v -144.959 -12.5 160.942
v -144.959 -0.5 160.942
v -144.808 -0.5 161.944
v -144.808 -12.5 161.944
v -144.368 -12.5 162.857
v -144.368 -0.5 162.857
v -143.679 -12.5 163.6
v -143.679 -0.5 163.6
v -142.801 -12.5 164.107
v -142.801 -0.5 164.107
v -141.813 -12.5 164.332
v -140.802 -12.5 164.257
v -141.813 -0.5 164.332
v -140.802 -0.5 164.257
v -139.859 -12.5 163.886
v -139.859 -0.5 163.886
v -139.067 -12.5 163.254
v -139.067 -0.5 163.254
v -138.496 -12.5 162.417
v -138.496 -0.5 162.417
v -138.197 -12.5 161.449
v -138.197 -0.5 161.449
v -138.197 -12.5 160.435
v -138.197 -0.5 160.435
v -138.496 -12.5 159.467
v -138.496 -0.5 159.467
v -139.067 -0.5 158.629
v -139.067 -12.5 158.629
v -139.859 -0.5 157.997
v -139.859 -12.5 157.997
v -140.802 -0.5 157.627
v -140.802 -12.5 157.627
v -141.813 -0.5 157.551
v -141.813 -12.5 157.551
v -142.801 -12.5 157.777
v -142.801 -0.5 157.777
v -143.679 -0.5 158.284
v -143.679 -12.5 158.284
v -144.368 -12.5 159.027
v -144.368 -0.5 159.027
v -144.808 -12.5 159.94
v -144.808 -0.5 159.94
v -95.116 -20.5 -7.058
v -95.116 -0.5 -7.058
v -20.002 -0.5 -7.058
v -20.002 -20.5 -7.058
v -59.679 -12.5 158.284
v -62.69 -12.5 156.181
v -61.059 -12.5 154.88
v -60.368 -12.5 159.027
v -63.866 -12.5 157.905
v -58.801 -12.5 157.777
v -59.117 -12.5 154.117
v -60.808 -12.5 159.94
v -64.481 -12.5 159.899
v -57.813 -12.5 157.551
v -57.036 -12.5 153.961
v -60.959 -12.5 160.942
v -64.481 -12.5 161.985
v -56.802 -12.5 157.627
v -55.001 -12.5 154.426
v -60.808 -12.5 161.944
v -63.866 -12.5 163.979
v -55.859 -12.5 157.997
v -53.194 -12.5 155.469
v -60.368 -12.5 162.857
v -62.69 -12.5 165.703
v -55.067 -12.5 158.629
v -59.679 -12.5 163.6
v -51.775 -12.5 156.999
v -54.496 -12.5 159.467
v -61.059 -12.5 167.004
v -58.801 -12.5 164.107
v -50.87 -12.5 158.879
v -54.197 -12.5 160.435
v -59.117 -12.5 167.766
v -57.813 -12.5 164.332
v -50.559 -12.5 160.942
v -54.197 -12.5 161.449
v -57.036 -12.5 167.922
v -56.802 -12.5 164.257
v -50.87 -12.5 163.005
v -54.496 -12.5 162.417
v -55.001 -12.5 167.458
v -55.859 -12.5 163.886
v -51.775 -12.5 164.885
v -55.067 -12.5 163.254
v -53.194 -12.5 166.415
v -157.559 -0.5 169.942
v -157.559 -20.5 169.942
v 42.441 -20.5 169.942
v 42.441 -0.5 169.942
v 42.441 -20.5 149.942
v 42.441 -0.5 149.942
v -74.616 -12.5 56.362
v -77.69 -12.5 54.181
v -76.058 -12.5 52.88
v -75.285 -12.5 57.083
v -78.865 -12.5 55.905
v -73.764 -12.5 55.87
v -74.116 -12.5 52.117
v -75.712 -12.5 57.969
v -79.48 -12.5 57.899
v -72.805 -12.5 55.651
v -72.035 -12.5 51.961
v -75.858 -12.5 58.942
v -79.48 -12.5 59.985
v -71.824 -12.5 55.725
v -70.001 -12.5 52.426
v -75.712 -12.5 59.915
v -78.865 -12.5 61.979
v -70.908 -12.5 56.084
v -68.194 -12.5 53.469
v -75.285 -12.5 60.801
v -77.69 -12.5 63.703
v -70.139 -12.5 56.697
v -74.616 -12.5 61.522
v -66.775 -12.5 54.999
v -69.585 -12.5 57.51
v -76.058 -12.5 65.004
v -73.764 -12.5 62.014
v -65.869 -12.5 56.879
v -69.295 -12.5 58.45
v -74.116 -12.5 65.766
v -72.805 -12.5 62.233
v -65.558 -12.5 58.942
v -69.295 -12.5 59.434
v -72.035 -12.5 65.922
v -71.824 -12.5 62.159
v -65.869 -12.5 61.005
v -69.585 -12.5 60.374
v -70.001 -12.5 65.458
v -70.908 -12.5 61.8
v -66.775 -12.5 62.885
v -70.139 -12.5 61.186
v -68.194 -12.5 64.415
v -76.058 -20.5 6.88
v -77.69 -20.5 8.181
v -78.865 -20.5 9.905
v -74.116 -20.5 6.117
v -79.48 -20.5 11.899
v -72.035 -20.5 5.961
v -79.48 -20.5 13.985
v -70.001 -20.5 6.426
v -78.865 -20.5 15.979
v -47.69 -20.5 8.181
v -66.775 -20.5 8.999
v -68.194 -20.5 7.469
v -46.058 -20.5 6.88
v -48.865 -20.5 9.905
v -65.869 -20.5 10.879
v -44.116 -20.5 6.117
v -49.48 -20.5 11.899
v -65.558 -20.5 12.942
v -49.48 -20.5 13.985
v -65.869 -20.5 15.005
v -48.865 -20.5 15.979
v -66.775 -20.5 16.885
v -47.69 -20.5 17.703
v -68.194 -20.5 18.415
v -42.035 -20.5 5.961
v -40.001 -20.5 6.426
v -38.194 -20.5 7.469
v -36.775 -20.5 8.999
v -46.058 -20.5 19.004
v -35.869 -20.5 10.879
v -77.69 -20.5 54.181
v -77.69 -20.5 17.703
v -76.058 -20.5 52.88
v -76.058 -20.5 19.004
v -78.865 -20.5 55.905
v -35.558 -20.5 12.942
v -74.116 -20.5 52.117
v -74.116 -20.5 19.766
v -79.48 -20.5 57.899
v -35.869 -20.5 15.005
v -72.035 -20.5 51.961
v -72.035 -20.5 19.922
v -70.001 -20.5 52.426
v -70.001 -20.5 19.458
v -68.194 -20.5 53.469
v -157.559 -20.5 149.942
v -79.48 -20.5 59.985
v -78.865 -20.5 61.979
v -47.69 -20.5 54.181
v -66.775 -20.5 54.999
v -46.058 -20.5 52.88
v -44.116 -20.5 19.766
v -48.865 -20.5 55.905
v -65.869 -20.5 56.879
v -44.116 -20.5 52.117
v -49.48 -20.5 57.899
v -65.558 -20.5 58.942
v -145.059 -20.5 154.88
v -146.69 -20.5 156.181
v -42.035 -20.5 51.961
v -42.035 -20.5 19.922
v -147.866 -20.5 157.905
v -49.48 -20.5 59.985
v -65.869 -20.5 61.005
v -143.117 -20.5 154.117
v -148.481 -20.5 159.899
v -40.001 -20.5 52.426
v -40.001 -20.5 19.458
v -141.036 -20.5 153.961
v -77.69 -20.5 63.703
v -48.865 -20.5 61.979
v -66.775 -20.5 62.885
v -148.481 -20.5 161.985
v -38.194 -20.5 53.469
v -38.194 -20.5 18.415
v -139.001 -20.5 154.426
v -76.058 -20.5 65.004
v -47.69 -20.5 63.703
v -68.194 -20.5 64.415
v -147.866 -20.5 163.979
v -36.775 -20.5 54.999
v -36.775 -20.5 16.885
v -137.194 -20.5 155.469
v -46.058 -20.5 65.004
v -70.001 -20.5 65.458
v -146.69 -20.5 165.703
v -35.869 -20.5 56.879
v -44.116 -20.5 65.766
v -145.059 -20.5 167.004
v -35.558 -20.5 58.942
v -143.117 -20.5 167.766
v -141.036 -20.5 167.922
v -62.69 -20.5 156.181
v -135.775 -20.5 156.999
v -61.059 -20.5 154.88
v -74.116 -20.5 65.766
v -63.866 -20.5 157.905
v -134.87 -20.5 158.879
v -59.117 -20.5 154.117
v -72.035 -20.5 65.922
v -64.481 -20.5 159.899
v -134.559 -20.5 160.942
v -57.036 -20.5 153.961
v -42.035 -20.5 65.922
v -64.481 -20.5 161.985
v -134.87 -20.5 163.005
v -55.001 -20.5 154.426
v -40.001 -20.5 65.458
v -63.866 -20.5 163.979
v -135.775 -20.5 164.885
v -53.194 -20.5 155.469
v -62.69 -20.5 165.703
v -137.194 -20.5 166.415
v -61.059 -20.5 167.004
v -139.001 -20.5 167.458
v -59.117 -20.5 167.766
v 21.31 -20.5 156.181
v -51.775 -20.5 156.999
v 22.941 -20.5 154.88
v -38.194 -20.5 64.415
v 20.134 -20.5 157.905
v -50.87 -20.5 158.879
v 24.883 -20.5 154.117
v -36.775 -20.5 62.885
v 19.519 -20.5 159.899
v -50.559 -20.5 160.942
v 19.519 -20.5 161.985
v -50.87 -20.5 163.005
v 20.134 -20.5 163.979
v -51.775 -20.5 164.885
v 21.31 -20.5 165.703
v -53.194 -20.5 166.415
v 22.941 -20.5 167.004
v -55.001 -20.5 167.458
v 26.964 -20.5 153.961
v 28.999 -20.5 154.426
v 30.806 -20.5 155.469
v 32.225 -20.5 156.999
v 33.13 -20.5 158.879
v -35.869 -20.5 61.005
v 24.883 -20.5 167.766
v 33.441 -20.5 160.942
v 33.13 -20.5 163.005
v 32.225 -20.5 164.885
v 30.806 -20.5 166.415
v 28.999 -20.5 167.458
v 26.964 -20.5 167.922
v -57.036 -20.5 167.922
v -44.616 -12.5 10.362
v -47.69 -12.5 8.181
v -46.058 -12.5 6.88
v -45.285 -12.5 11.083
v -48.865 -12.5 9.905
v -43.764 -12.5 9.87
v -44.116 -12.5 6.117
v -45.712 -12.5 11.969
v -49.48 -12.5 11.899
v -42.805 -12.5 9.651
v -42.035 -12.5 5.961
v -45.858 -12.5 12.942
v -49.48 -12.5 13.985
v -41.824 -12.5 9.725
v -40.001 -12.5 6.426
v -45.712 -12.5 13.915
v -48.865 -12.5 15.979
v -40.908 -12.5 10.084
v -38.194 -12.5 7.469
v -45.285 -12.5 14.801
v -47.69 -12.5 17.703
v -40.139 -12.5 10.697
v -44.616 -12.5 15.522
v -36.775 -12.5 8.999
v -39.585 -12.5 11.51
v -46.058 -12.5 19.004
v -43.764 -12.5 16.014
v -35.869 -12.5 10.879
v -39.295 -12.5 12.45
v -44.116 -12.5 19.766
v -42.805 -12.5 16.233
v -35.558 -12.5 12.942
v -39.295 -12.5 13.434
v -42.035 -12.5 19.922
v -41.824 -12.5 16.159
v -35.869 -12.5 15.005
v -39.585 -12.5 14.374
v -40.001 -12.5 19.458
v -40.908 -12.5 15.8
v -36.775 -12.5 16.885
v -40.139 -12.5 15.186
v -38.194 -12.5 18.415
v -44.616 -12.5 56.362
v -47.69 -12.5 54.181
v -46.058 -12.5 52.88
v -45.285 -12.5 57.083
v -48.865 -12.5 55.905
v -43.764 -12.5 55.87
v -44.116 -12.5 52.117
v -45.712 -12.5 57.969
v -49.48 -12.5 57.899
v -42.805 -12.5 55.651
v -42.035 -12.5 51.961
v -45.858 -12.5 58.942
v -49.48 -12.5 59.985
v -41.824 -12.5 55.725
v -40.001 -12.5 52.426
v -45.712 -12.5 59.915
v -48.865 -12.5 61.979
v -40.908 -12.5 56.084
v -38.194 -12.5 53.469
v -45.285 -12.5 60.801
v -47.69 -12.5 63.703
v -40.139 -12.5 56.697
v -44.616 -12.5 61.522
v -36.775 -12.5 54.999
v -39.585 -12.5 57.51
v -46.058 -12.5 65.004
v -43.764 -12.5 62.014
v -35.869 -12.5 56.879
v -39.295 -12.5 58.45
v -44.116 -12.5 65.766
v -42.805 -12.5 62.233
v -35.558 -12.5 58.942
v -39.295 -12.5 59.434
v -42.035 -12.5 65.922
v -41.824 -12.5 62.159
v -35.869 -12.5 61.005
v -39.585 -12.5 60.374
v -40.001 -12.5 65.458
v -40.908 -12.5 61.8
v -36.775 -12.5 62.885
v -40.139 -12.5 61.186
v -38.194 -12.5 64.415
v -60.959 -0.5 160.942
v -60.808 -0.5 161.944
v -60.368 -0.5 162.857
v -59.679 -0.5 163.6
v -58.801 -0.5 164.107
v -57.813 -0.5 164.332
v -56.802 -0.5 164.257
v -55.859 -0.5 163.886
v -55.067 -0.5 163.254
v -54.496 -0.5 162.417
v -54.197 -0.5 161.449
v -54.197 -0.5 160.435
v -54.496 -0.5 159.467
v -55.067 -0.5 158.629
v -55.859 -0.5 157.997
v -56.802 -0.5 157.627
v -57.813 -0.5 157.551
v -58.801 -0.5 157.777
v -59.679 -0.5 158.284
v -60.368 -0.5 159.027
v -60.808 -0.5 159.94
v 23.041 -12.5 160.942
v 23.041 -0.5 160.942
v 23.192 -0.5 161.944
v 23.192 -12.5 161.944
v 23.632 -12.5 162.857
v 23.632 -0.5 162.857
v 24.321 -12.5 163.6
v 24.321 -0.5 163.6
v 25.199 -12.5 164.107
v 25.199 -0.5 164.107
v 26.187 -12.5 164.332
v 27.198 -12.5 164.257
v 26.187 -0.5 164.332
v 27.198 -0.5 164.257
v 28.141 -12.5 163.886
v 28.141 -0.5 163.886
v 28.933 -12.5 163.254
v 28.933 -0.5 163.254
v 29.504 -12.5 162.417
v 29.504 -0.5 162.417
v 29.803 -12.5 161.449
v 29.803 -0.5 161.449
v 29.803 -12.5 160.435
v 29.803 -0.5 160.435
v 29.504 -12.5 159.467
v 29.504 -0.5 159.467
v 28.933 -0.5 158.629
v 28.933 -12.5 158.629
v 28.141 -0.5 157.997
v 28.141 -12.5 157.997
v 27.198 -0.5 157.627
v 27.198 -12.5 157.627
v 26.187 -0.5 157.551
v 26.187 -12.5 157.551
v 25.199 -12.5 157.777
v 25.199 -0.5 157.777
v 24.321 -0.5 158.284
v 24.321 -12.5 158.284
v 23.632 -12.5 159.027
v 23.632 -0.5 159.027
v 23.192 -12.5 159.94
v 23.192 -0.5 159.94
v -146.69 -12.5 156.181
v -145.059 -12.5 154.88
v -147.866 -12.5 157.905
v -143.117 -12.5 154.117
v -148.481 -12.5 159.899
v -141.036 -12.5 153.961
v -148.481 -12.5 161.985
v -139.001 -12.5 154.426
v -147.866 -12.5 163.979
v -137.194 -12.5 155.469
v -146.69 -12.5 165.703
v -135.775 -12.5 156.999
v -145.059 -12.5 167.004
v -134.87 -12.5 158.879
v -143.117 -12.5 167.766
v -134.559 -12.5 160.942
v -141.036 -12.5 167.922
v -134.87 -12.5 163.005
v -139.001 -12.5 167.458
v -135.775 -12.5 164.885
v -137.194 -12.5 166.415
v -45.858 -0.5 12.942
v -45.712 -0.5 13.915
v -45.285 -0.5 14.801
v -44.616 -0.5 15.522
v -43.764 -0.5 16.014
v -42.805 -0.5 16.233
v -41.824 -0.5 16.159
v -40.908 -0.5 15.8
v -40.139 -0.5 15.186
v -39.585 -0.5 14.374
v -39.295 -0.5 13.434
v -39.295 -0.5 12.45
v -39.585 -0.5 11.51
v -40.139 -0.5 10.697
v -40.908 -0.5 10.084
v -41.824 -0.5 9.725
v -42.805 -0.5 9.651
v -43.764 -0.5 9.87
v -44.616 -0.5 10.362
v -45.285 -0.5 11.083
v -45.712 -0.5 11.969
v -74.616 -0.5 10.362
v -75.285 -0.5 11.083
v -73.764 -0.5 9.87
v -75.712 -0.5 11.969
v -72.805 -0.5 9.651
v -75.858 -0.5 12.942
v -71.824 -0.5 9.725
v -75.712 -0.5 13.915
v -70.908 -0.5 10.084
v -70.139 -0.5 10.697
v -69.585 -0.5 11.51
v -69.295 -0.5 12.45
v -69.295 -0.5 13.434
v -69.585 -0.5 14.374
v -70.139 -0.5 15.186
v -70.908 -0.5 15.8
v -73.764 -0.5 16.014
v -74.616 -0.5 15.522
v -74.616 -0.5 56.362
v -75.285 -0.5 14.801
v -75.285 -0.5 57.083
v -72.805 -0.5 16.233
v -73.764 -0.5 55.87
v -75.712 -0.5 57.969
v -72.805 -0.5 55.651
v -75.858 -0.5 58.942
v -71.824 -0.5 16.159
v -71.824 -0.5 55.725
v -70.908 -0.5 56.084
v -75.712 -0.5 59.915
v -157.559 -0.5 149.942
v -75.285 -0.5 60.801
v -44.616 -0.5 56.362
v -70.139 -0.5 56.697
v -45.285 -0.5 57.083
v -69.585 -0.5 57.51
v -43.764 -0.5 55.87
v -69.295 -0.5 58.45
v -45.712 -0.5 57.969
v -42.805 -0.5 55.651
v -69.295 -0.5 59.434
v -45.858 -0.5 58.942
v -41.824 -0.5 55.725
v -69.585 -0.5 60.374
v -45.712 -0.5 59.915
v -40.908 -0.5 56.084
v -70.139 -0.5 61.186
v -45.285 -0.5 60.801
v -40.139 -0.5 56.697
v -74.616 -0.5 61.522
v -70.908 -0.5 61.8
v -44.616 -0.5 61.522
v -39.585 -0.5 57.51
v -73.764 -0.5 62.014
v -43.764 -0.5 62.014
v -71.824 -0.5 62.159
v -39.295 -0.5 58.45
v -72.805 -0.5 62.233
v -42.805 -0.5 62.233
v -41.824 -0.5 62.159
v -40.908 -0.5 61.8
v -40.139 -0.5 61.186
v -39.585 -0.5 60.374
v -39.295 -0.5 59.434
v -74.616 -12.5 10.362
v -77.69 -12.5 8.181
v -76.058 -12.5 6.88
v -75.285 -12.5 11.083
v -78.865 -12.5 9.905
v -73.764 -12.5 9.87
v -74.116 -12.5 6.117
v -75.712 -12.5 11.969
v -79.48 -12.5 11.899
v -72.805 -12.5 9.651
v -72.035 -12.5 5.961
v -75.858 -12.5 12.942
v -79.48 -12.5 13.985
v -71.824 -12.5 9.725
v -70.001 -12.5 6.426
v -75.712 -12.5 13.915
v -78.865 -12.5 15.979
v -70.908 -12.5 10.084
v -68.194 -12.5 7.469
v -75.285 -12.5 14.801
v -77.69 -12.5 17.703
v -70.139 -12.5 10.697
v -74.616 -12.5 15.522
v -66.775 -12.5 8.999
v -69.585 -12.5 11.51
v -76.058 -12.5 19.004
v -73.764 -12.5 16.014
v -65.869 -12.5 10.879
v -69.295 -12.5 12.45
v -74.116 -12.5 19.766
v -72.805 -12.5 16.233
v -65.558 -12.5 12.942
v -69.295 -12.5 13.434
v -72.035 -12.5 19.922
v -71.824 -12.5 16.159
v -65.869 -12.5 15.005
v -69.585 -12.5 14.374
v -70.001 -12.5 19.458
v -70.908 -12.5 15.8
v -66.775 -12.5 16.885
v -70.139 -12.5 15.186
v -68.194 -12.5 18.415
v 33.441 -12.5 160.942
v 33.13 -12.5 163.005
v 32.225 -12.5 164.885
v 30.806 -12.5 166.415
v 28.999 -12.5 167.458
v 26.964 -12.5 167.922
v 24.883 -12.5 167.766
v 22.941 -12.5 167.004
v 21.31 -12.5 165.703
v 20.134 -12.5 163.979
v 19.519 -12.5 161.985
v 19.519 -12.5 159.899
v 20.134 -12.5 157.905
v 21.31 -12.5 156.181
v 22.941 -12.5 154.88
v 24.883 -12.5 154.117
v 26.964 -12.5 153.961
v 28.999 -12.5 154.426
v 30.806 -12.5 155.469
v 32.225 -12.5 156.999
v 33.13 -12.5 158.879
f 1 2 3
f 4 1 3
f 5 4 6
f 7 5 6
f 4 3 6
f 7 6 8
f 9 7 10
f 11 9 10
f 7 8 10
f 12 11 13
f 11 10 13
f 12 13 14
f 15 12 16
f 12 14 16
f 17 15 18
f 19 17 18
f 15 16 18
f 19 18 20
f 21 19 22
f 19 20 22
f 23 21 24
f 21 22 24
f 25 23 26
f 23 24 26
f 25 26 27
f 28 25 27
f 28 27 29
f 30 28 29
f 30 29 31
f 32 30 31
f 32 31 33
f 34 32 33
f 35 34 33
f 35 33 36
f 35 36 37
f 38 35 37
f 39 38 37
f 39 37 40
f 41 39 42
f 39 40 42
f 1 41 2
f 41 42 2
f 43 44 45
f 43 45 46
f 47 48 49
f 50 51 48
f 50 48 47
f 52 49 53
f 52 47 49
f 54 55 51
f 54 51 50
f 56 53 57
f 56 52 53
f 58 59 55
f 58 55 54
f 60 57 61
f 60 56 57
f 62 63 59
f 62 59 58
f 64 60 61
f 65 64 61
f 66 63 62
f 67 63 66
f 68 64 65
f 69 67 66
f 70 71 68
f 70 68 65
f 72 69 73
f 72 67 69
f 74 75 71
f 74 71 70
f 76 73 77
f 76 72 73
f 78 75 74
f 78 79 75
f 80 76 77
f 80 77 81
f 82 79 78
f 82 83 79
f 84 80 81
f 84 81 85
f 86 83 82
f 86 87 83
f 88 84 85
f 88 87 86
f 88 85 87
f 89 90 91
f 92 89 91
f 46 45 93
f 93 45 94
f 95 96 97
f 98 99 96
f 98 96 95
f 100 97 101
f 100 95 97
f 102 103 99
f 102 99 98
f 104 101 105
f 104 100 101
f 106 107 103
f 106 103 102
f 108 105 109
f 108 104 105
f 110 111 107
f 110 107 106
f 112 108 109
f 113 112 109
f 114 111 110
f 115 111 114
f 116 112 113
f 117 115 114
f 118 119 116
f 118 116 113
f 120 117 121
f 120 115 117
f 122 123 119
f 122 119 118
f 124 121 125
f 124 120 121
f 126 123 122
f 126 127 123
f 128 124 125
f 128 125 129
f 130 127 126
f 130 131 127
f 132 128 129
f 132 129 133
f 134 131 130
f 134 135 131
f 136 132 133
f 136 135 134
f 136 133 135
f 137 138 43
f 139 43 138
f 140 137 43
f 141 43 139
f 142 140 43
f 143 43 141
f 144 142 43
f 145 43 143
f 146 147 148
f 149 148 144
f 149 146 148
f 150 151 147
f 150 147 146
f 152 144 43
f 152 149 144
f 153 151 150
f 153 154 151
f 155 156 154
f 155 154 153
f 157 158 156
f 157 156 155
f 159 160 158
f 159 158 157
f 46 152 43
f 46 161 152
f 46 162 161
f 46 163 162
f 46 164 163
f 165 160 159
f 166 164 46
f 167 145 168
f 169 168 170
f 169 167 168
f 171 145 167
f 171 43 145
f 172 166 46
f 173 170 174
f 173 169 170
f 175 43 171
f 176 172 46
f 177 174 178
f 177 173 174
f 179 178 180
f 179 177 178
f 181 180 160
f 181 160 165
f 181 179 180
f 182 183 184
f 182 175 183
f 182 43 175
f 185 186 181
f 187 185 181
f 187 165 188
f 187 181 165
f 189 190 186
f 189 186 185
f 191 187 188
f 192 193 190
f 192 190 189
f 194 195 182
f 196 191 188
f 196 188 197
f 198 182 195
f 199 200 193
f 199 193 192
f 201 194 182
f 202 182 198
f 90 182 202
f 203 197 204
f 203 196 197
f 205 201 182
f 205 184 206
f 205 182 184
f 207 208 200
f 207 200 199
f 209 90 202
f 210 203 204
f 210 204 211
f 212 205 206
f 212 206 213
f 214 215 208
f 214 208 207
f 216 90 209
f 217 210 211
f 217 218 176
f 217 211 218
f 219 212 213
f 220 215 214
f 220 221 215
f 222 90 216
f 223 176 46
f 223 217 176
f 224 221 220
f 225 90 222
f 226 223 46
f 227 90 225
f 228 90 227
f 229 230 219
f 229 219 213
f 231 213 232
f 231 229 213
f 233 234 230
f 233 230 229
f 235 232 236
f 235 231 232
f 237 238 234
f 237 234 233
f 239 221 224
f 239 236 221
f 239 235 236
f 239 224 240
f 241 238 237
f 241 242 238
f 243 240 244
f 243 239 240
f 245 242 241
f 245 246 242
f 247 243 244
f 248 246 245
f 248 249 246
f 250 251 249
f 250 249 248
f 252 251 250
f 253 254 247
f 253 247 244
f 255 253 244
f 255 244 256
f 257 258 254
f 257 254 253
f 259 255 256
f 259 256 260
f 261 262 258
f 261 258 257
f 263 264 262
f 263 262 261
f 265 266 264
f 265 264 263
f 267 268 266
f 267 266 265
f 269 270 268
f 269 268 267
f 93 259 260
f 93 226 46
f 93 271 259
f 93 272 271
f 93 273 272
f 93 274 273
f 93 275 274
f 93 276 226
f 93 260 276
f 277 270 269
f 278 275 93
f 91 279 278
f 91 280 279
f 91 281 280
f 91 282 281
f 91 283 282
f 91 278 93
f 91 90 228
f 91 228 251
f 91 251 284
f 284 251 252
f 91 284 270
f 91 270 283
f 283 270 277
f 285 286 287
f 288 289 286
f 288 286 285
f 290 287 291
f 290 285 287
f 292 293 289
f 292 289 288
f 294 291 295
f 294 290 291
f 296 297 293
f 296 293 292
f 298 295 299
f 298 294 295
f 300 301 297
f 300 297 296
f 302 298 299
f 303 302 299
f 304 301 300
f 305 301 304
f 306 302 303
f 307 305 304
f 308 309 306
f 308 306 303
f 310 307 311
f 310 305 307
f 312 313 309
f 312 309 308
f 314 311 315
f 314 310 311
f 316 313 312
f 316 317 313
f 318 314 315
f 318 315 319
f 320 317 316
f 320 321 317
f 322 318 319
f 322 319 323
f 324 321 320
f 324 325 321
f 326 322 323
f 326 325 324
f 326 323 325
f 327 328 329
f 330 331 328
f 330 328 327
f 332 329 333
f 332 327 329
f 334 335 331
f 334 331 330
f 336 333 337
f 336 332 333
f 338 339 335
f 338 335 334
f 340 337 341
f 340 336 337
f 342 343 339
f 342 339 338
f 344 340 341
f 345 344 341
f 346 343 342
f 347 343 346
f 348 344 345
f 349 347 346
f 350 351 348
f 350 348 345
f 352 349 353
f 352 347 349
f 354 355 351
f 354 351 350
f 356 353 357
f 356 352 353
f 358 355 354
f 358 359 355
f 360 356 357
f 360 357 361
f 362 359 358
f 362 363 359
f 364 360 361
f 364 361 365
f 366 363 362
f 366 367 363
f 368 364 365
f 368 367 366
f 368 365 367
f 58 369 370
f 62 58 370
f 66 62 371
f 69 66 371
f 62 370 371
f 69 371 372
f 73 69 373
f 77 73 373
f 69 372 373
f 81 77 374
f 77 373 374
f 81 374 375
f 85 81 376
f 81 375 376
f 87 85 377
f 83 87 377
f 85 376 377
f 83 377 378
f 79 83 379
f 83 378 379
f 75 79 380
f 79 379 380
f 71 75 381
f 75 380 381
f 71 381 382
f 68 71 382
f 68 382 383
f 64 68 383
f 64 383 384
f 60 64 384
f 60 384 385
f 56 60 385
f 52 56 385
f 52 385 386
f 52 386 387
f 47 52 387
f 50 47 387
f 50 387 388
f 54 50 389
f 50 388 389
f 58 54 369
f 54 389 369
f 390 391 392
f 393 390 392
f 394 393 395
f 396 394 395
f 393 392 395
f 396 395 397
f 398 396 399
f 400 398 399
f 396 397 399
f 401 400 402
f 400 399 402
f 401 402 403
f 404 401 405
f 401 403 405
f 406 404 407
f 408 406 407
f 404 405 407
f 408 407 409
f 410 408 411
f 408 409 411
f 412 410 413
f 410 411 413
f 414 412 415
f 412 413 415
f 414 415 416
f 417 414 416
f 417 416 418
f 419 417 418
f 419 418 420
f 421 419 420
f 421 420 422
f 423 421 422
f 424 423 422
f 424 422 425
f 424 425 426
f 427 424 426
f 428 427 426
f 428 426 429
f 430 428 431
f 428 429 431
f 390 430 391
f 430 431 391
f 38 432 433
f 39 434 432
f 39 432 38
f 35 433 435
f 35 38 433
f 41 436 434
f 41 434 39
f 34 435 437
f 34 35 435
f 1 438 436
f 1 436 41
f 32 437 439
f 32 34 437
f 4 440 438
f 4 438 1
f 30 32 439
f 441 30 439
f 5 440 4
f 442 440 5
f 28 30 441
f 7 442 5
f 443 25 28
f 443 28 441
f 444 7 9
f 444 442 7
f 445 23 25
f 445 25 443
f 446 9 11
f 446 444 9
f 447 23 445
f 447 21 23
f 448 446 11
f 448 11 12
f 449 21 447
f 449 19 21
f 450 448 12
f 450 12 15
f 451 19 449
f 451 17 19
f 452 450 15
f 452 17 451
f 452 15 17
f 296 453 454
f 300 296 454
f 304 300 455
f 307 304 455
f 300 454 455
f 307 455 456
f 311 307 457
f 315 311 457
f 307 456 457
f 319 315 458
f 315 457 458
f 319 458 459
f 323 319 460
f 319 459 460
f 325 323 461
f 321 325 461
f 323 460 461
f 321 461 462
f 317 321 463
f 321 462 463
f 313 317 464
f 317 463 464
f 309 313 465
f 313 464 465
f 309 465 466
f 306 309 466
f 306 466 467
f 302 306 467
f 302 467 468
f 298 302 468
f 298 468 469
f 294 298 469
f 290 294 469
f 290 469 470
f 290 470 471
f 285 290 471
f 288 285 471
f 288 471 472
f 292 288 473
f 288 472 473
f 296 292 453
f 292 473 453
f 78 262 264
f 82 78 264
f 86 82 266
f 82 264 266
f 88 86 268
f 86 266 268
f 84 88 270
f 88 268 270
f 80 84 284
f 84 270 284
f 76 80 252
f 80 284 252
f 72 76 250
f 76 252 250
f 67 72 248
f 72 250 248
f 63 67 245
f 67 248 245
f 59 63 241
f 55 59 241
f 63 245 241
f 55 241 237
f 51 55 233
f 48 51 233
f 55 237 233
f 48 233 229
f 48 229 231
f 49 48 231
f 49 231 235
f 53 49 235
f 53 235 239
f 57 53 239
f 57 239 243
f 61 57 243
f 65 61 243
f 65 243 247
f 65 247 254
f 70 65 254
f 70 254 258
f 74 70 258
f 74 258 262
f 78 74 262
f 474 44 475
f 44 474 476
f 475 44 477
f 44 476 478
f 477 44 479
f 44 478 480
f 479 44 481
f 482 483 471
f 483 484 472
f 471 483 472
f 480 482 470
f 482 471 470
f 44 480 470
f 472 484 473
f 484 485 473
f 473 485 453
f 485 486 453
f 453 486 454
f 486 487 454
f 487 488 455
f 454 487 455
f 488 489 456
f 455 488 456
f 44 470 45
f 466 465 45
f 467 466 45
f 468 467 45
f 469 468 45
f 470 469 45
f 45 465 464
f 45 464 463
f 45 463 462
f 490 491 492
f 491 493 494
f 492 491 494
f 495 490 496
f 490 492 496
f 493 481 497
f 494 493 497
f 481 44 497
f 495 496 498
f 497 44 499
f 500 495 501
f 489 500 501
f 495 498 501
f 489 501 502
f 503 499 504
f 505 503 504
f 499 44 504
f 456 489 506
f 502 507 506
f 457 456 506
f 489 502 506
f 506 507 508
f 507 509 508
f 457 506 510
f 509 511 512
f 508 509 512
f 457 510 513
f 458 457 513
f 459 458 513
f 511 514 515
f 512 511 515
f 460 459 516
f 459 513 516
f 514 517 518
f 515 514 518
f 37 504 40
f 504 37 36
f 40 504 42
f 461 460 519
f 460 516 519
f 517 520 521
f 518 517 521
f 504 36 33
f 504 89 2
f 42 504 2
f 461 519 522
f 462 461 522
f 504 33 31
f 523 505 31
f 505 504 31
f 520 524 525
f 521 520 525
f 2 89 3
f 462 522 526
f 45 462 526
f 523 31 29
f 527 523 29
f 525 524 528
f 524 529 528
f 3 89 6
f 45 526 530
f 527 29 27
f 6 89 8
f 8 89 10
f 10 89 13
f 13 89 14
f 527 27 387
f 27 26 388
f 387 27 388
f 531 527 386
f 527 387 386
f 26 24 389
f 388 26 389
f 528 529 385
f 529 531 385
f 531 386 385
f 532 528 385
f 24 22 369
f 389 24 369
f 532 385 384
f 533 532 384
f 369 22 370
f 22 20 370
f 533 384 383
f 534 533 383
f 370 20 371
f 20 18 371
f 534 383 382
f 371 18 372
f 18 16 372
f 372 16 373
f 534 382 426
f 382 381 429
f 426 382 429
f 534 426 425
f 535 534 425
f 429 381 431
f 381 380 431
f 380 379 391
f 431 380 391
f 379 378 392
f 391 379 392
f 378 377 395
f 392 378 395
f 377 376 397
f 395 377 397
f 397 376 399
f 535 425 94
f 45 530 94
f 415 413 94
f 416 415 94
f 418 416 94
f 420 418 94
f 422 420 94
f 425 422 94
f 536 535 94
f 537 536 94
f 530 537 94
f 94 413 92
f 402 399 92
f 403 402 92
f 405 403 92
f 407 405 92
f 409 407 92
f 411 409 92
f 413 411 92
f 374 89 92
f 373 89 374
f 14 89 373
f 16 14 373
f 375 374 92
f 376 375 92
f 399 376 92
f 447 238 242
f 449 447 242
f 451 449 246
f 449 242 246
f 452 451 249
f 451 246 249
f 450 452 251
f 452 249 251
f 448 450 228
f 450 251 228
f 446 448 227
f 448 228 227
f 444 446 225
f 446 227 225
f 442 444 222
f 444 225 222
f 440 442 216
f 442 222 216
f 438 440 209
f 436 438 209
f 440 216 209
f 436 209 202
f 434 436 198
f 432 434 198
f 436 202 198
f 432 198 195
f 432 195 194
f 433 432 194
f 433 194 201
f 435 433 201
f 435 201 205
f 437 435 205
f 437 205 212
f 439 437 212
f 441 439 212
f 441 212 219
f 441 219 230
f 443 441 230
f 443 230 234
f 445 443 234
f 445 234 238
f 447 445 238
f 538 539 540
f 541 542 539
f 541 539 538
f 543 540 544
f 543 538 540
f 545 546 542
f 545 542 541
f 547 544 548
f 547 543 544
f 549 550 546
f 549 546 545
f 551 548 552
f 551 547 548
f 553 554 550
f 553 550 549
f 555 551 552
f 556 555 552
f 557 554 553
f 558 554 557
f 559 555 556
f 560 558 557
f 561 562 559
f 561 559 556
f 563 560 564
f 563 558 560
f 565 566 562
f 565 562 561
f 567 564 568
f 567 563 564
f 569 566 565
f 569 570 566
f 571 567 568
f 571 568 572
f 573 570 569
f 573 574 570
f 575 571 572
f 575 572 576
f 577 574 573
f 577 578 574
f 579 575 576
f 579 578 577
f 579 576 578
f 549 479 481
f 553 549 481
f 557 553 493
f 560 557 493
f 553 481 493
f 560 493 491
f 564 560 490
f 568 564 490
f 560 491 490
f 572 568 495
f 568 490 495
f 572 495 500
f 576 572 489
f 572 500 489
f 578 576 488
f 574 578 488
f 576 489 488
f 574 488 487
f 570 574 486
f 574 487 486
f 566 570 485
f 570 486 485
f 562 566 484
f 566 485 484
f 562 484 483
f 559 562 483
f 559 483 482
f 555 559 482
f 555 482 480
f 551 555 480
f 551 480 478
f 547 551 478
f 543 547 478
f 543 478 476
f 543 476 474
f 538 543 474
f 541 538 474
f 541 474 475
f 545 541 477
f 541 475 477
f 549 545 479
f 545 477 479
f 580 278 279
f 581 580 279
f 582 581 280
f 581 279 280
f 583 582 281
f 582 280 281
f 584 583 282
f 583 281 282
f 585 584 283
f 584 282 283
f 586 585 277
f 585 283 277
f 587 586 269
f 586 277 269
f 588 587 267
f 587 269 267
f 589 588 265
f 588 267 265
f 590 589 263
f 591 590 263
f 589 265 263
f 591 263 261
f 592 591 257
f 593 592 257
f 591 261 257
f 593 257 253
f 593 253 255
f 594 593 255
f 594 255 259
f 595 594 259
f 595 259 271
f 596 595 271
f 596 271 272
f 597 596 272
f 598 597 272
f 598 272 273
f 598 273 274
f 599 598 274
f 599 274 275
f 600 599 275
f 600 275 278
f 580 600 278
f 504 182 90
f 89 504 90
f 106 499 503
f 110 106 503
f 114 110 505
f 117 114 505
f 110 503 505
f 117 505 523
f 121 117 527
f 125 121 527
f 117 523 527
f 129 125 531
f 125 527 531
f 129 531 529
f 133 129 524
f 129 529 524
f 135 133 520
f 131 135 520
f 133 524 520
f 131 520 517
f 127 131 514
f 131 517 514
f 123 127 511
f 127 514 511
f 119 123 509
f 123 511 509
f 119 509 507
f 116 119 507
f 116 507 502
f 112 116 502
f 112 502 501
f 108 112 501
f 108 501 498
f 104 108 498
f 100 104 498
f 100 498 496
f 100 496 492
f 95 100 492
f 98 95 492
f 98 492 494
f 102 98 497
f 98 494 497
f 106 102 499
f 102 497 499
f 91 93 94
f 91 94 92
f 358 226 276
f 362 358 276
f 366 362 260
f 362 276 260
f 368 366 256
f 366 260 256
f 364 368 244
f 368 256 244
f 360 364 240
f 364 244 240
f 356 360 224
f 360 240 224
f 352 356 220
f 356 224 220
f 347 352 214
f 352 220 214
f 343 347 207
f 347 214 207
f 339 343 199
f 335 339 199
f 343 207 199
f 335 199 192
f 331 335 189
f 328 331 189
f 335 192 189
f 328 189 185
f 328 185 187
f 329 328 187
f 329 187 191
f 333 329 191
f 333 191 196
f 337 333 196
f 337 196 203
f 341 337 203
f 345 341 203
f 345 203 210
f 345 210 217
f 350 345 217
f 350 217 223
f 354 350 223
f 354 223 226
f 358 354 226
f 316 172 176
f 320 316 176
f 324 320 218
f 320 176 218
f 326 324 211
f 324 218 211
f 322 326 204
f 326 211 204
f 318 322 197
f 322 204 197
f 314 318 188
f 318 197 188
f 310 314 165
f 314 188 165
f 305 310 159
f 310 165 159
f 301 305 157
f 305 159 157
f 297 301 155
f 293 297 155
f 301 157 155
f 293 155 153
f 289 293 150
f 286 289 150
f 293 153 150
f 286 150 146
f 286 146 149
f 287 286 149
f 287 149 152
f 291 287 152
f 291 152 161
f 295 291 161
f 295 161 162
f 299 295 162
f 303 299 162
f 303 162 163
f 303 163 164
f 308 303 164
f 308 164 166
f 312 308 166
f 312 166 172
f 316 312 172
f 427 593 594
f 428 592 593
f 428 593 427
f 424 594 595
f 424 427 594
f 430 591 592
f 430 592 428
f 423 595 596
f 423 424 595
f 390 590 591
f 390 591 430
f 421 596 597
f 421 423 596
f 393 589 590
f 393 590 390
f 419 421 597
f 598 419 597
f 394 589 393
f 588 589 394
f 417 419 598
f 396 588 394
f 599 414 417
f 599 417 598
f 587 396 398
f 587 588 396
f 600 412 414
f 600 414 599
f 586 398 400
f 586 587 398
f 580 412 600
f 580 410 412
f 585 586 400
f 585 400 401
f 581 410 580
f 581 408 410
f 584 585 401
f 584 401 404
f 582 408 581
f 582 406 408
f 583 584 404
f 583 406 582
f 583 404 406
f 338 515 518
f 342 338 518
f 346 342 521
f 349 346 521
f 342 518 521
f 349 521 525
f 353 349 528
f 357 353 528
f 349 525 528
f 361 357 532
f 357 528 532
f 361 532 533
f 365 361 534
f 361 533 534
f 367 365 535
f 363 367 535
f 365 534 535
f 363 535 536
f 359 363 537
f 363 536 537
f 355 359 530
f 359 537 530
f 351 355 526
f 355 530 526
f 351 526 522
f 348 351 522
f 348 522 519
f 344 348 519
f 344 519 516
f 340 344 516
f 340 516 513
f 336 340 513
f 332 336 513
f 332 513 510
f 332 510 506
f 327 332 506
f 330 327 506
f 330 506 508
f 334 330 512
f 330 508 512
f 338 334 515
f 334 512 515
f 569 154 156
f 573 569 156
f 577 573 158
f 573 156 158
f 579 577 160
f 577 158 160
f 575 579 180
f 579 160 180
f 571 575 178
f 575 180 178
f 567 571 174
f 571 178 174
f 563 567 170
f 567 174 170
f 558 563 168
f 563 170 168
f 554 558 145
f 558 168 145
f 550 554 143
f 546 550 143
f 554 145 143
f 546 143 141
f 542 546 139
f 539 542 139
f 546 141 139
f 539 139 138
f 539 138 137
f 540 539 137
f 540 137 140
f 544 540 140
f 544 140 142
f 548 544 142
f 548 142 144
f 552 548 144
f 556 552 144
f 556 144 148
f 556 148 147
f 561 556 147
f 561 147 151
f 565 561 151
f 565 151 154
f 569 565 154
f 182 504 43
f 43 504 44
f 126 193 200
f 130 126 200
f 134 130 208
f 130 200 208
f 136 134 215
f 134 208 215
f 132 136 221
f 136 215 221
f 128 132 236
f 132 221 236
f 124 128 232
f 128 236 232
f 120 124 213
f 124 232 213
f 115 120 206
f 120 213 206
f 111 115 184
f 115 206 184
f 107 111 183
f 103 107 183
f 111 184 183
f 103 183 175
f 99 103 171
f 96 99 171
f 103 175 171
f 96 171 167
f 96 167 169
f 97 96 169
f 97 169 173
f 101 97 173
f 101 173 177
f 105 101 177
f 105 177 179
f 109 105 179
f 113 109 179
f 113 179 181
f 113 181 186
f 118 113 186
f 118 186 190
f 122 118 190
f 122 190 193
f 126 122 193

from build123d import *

# Parameters (mm, degrees)
F1_DEPTH        = 20.5
F2_W            = 200
F2_H            = 20
F3_DEPTH        = 20.5
F4_DEPTH        = 19
F5_DEPTH        = 25
F6_DEPTH        = 25
F9_D            = 6.6
F9_CBORE_D      = 14
F9_CBORE_DEPTH  = 8
F11_D           = 6.8
F11_CBORE_D     = 14
F11_CBORE_DEPTH = 8
F12_DEPTH       = 0.5


with BuildPart() as f1:
    # F0 (on Front) → F1 (new body)
    with BuildSketch(Plane.XZ):
        Polygon((42.4411185086, 149.9418458194), (-157.5588814914, 149.9418458194), (-87.5588814914, -26.0581541806), (-57.5588814914, -26.0581541806), (-27.5588814914, -26.0581541806), align=None)
    extrude(amount=F1_DEPTH)

    # F2 (on face) → F3 (join)
    with BuildSketch(Plane.XZ.offset(20.5)):
        with Locations((-57.5588814914, 159.9418458194)):
            Rectangle(F2_W, F2_H)
    extrude(amount=-F3_DEPTH)

    # F4 (cut): a face of the model
    f4_faces = [f1.faces().sort_by_distance(p)[0] for p in [
        (-57.5588814914, -10.25, -26.0581541806),
    ]]
    extrude(f4_faces, amount=-F4_DEPTH, mode=Mode.SUBTRACT)

    # F5 (cut): a face of the model
    f5_faces = [f1.faces().sort_by_distance(p)[0] for p in [
        (-87.5588814914, -10.25, -16.5581541806),
    ]]
    extrude(f5_faces, amount=-F5_DEPTH, mode=Mode.SUBTRACT)

    # F6 (cut): a face of the model
    f6_faces = [f1.faces().sort_by_distance(p)[0] for p in [
        (-27.5588814914, -10.25, -16.5581541806),
    ]]
    extrude(f6_faces, amount=-F6_DEPTH, mode=Mode.SUBTRACT)

    # F9 (through all)
    with Locations(Plane.XZ.offset(20.5)):
        with Locations((-72.5584090471, 58.9418458194), (-42.5584090471, 58.9418458194), (-42.5584090471, 12.9418458194), (-72.5584090471, 12.9418458194)):
            CounterBoreHole(F9_D / 2, F9_CBORE_D / 2, F9_CBORE_DEPTH)

    # F11 (through all)
    with Locations(Plane.XZ.offset(20.5)):
        with Locations((-141.5588814914, 160.9418458194), (26.4411185086, 160.9418458194), (-57.5588814914, 160.9418458194)):
            CounterBoreHole(F11_D / 2, F11_CBORE_D / 2, F11_CBORE_DEPTH)

    # F12 (cut): a face of the model
    f12_faces = [f1.faces().sort_by_distance(p)[0] for p in [
        (-57.5588840418, 0, 95.3321481764),
    ]]
    extrude(f12_faces, amount=-F12_DEPTH, mode=Mode.SUBTRACT)


solid = f1.part
